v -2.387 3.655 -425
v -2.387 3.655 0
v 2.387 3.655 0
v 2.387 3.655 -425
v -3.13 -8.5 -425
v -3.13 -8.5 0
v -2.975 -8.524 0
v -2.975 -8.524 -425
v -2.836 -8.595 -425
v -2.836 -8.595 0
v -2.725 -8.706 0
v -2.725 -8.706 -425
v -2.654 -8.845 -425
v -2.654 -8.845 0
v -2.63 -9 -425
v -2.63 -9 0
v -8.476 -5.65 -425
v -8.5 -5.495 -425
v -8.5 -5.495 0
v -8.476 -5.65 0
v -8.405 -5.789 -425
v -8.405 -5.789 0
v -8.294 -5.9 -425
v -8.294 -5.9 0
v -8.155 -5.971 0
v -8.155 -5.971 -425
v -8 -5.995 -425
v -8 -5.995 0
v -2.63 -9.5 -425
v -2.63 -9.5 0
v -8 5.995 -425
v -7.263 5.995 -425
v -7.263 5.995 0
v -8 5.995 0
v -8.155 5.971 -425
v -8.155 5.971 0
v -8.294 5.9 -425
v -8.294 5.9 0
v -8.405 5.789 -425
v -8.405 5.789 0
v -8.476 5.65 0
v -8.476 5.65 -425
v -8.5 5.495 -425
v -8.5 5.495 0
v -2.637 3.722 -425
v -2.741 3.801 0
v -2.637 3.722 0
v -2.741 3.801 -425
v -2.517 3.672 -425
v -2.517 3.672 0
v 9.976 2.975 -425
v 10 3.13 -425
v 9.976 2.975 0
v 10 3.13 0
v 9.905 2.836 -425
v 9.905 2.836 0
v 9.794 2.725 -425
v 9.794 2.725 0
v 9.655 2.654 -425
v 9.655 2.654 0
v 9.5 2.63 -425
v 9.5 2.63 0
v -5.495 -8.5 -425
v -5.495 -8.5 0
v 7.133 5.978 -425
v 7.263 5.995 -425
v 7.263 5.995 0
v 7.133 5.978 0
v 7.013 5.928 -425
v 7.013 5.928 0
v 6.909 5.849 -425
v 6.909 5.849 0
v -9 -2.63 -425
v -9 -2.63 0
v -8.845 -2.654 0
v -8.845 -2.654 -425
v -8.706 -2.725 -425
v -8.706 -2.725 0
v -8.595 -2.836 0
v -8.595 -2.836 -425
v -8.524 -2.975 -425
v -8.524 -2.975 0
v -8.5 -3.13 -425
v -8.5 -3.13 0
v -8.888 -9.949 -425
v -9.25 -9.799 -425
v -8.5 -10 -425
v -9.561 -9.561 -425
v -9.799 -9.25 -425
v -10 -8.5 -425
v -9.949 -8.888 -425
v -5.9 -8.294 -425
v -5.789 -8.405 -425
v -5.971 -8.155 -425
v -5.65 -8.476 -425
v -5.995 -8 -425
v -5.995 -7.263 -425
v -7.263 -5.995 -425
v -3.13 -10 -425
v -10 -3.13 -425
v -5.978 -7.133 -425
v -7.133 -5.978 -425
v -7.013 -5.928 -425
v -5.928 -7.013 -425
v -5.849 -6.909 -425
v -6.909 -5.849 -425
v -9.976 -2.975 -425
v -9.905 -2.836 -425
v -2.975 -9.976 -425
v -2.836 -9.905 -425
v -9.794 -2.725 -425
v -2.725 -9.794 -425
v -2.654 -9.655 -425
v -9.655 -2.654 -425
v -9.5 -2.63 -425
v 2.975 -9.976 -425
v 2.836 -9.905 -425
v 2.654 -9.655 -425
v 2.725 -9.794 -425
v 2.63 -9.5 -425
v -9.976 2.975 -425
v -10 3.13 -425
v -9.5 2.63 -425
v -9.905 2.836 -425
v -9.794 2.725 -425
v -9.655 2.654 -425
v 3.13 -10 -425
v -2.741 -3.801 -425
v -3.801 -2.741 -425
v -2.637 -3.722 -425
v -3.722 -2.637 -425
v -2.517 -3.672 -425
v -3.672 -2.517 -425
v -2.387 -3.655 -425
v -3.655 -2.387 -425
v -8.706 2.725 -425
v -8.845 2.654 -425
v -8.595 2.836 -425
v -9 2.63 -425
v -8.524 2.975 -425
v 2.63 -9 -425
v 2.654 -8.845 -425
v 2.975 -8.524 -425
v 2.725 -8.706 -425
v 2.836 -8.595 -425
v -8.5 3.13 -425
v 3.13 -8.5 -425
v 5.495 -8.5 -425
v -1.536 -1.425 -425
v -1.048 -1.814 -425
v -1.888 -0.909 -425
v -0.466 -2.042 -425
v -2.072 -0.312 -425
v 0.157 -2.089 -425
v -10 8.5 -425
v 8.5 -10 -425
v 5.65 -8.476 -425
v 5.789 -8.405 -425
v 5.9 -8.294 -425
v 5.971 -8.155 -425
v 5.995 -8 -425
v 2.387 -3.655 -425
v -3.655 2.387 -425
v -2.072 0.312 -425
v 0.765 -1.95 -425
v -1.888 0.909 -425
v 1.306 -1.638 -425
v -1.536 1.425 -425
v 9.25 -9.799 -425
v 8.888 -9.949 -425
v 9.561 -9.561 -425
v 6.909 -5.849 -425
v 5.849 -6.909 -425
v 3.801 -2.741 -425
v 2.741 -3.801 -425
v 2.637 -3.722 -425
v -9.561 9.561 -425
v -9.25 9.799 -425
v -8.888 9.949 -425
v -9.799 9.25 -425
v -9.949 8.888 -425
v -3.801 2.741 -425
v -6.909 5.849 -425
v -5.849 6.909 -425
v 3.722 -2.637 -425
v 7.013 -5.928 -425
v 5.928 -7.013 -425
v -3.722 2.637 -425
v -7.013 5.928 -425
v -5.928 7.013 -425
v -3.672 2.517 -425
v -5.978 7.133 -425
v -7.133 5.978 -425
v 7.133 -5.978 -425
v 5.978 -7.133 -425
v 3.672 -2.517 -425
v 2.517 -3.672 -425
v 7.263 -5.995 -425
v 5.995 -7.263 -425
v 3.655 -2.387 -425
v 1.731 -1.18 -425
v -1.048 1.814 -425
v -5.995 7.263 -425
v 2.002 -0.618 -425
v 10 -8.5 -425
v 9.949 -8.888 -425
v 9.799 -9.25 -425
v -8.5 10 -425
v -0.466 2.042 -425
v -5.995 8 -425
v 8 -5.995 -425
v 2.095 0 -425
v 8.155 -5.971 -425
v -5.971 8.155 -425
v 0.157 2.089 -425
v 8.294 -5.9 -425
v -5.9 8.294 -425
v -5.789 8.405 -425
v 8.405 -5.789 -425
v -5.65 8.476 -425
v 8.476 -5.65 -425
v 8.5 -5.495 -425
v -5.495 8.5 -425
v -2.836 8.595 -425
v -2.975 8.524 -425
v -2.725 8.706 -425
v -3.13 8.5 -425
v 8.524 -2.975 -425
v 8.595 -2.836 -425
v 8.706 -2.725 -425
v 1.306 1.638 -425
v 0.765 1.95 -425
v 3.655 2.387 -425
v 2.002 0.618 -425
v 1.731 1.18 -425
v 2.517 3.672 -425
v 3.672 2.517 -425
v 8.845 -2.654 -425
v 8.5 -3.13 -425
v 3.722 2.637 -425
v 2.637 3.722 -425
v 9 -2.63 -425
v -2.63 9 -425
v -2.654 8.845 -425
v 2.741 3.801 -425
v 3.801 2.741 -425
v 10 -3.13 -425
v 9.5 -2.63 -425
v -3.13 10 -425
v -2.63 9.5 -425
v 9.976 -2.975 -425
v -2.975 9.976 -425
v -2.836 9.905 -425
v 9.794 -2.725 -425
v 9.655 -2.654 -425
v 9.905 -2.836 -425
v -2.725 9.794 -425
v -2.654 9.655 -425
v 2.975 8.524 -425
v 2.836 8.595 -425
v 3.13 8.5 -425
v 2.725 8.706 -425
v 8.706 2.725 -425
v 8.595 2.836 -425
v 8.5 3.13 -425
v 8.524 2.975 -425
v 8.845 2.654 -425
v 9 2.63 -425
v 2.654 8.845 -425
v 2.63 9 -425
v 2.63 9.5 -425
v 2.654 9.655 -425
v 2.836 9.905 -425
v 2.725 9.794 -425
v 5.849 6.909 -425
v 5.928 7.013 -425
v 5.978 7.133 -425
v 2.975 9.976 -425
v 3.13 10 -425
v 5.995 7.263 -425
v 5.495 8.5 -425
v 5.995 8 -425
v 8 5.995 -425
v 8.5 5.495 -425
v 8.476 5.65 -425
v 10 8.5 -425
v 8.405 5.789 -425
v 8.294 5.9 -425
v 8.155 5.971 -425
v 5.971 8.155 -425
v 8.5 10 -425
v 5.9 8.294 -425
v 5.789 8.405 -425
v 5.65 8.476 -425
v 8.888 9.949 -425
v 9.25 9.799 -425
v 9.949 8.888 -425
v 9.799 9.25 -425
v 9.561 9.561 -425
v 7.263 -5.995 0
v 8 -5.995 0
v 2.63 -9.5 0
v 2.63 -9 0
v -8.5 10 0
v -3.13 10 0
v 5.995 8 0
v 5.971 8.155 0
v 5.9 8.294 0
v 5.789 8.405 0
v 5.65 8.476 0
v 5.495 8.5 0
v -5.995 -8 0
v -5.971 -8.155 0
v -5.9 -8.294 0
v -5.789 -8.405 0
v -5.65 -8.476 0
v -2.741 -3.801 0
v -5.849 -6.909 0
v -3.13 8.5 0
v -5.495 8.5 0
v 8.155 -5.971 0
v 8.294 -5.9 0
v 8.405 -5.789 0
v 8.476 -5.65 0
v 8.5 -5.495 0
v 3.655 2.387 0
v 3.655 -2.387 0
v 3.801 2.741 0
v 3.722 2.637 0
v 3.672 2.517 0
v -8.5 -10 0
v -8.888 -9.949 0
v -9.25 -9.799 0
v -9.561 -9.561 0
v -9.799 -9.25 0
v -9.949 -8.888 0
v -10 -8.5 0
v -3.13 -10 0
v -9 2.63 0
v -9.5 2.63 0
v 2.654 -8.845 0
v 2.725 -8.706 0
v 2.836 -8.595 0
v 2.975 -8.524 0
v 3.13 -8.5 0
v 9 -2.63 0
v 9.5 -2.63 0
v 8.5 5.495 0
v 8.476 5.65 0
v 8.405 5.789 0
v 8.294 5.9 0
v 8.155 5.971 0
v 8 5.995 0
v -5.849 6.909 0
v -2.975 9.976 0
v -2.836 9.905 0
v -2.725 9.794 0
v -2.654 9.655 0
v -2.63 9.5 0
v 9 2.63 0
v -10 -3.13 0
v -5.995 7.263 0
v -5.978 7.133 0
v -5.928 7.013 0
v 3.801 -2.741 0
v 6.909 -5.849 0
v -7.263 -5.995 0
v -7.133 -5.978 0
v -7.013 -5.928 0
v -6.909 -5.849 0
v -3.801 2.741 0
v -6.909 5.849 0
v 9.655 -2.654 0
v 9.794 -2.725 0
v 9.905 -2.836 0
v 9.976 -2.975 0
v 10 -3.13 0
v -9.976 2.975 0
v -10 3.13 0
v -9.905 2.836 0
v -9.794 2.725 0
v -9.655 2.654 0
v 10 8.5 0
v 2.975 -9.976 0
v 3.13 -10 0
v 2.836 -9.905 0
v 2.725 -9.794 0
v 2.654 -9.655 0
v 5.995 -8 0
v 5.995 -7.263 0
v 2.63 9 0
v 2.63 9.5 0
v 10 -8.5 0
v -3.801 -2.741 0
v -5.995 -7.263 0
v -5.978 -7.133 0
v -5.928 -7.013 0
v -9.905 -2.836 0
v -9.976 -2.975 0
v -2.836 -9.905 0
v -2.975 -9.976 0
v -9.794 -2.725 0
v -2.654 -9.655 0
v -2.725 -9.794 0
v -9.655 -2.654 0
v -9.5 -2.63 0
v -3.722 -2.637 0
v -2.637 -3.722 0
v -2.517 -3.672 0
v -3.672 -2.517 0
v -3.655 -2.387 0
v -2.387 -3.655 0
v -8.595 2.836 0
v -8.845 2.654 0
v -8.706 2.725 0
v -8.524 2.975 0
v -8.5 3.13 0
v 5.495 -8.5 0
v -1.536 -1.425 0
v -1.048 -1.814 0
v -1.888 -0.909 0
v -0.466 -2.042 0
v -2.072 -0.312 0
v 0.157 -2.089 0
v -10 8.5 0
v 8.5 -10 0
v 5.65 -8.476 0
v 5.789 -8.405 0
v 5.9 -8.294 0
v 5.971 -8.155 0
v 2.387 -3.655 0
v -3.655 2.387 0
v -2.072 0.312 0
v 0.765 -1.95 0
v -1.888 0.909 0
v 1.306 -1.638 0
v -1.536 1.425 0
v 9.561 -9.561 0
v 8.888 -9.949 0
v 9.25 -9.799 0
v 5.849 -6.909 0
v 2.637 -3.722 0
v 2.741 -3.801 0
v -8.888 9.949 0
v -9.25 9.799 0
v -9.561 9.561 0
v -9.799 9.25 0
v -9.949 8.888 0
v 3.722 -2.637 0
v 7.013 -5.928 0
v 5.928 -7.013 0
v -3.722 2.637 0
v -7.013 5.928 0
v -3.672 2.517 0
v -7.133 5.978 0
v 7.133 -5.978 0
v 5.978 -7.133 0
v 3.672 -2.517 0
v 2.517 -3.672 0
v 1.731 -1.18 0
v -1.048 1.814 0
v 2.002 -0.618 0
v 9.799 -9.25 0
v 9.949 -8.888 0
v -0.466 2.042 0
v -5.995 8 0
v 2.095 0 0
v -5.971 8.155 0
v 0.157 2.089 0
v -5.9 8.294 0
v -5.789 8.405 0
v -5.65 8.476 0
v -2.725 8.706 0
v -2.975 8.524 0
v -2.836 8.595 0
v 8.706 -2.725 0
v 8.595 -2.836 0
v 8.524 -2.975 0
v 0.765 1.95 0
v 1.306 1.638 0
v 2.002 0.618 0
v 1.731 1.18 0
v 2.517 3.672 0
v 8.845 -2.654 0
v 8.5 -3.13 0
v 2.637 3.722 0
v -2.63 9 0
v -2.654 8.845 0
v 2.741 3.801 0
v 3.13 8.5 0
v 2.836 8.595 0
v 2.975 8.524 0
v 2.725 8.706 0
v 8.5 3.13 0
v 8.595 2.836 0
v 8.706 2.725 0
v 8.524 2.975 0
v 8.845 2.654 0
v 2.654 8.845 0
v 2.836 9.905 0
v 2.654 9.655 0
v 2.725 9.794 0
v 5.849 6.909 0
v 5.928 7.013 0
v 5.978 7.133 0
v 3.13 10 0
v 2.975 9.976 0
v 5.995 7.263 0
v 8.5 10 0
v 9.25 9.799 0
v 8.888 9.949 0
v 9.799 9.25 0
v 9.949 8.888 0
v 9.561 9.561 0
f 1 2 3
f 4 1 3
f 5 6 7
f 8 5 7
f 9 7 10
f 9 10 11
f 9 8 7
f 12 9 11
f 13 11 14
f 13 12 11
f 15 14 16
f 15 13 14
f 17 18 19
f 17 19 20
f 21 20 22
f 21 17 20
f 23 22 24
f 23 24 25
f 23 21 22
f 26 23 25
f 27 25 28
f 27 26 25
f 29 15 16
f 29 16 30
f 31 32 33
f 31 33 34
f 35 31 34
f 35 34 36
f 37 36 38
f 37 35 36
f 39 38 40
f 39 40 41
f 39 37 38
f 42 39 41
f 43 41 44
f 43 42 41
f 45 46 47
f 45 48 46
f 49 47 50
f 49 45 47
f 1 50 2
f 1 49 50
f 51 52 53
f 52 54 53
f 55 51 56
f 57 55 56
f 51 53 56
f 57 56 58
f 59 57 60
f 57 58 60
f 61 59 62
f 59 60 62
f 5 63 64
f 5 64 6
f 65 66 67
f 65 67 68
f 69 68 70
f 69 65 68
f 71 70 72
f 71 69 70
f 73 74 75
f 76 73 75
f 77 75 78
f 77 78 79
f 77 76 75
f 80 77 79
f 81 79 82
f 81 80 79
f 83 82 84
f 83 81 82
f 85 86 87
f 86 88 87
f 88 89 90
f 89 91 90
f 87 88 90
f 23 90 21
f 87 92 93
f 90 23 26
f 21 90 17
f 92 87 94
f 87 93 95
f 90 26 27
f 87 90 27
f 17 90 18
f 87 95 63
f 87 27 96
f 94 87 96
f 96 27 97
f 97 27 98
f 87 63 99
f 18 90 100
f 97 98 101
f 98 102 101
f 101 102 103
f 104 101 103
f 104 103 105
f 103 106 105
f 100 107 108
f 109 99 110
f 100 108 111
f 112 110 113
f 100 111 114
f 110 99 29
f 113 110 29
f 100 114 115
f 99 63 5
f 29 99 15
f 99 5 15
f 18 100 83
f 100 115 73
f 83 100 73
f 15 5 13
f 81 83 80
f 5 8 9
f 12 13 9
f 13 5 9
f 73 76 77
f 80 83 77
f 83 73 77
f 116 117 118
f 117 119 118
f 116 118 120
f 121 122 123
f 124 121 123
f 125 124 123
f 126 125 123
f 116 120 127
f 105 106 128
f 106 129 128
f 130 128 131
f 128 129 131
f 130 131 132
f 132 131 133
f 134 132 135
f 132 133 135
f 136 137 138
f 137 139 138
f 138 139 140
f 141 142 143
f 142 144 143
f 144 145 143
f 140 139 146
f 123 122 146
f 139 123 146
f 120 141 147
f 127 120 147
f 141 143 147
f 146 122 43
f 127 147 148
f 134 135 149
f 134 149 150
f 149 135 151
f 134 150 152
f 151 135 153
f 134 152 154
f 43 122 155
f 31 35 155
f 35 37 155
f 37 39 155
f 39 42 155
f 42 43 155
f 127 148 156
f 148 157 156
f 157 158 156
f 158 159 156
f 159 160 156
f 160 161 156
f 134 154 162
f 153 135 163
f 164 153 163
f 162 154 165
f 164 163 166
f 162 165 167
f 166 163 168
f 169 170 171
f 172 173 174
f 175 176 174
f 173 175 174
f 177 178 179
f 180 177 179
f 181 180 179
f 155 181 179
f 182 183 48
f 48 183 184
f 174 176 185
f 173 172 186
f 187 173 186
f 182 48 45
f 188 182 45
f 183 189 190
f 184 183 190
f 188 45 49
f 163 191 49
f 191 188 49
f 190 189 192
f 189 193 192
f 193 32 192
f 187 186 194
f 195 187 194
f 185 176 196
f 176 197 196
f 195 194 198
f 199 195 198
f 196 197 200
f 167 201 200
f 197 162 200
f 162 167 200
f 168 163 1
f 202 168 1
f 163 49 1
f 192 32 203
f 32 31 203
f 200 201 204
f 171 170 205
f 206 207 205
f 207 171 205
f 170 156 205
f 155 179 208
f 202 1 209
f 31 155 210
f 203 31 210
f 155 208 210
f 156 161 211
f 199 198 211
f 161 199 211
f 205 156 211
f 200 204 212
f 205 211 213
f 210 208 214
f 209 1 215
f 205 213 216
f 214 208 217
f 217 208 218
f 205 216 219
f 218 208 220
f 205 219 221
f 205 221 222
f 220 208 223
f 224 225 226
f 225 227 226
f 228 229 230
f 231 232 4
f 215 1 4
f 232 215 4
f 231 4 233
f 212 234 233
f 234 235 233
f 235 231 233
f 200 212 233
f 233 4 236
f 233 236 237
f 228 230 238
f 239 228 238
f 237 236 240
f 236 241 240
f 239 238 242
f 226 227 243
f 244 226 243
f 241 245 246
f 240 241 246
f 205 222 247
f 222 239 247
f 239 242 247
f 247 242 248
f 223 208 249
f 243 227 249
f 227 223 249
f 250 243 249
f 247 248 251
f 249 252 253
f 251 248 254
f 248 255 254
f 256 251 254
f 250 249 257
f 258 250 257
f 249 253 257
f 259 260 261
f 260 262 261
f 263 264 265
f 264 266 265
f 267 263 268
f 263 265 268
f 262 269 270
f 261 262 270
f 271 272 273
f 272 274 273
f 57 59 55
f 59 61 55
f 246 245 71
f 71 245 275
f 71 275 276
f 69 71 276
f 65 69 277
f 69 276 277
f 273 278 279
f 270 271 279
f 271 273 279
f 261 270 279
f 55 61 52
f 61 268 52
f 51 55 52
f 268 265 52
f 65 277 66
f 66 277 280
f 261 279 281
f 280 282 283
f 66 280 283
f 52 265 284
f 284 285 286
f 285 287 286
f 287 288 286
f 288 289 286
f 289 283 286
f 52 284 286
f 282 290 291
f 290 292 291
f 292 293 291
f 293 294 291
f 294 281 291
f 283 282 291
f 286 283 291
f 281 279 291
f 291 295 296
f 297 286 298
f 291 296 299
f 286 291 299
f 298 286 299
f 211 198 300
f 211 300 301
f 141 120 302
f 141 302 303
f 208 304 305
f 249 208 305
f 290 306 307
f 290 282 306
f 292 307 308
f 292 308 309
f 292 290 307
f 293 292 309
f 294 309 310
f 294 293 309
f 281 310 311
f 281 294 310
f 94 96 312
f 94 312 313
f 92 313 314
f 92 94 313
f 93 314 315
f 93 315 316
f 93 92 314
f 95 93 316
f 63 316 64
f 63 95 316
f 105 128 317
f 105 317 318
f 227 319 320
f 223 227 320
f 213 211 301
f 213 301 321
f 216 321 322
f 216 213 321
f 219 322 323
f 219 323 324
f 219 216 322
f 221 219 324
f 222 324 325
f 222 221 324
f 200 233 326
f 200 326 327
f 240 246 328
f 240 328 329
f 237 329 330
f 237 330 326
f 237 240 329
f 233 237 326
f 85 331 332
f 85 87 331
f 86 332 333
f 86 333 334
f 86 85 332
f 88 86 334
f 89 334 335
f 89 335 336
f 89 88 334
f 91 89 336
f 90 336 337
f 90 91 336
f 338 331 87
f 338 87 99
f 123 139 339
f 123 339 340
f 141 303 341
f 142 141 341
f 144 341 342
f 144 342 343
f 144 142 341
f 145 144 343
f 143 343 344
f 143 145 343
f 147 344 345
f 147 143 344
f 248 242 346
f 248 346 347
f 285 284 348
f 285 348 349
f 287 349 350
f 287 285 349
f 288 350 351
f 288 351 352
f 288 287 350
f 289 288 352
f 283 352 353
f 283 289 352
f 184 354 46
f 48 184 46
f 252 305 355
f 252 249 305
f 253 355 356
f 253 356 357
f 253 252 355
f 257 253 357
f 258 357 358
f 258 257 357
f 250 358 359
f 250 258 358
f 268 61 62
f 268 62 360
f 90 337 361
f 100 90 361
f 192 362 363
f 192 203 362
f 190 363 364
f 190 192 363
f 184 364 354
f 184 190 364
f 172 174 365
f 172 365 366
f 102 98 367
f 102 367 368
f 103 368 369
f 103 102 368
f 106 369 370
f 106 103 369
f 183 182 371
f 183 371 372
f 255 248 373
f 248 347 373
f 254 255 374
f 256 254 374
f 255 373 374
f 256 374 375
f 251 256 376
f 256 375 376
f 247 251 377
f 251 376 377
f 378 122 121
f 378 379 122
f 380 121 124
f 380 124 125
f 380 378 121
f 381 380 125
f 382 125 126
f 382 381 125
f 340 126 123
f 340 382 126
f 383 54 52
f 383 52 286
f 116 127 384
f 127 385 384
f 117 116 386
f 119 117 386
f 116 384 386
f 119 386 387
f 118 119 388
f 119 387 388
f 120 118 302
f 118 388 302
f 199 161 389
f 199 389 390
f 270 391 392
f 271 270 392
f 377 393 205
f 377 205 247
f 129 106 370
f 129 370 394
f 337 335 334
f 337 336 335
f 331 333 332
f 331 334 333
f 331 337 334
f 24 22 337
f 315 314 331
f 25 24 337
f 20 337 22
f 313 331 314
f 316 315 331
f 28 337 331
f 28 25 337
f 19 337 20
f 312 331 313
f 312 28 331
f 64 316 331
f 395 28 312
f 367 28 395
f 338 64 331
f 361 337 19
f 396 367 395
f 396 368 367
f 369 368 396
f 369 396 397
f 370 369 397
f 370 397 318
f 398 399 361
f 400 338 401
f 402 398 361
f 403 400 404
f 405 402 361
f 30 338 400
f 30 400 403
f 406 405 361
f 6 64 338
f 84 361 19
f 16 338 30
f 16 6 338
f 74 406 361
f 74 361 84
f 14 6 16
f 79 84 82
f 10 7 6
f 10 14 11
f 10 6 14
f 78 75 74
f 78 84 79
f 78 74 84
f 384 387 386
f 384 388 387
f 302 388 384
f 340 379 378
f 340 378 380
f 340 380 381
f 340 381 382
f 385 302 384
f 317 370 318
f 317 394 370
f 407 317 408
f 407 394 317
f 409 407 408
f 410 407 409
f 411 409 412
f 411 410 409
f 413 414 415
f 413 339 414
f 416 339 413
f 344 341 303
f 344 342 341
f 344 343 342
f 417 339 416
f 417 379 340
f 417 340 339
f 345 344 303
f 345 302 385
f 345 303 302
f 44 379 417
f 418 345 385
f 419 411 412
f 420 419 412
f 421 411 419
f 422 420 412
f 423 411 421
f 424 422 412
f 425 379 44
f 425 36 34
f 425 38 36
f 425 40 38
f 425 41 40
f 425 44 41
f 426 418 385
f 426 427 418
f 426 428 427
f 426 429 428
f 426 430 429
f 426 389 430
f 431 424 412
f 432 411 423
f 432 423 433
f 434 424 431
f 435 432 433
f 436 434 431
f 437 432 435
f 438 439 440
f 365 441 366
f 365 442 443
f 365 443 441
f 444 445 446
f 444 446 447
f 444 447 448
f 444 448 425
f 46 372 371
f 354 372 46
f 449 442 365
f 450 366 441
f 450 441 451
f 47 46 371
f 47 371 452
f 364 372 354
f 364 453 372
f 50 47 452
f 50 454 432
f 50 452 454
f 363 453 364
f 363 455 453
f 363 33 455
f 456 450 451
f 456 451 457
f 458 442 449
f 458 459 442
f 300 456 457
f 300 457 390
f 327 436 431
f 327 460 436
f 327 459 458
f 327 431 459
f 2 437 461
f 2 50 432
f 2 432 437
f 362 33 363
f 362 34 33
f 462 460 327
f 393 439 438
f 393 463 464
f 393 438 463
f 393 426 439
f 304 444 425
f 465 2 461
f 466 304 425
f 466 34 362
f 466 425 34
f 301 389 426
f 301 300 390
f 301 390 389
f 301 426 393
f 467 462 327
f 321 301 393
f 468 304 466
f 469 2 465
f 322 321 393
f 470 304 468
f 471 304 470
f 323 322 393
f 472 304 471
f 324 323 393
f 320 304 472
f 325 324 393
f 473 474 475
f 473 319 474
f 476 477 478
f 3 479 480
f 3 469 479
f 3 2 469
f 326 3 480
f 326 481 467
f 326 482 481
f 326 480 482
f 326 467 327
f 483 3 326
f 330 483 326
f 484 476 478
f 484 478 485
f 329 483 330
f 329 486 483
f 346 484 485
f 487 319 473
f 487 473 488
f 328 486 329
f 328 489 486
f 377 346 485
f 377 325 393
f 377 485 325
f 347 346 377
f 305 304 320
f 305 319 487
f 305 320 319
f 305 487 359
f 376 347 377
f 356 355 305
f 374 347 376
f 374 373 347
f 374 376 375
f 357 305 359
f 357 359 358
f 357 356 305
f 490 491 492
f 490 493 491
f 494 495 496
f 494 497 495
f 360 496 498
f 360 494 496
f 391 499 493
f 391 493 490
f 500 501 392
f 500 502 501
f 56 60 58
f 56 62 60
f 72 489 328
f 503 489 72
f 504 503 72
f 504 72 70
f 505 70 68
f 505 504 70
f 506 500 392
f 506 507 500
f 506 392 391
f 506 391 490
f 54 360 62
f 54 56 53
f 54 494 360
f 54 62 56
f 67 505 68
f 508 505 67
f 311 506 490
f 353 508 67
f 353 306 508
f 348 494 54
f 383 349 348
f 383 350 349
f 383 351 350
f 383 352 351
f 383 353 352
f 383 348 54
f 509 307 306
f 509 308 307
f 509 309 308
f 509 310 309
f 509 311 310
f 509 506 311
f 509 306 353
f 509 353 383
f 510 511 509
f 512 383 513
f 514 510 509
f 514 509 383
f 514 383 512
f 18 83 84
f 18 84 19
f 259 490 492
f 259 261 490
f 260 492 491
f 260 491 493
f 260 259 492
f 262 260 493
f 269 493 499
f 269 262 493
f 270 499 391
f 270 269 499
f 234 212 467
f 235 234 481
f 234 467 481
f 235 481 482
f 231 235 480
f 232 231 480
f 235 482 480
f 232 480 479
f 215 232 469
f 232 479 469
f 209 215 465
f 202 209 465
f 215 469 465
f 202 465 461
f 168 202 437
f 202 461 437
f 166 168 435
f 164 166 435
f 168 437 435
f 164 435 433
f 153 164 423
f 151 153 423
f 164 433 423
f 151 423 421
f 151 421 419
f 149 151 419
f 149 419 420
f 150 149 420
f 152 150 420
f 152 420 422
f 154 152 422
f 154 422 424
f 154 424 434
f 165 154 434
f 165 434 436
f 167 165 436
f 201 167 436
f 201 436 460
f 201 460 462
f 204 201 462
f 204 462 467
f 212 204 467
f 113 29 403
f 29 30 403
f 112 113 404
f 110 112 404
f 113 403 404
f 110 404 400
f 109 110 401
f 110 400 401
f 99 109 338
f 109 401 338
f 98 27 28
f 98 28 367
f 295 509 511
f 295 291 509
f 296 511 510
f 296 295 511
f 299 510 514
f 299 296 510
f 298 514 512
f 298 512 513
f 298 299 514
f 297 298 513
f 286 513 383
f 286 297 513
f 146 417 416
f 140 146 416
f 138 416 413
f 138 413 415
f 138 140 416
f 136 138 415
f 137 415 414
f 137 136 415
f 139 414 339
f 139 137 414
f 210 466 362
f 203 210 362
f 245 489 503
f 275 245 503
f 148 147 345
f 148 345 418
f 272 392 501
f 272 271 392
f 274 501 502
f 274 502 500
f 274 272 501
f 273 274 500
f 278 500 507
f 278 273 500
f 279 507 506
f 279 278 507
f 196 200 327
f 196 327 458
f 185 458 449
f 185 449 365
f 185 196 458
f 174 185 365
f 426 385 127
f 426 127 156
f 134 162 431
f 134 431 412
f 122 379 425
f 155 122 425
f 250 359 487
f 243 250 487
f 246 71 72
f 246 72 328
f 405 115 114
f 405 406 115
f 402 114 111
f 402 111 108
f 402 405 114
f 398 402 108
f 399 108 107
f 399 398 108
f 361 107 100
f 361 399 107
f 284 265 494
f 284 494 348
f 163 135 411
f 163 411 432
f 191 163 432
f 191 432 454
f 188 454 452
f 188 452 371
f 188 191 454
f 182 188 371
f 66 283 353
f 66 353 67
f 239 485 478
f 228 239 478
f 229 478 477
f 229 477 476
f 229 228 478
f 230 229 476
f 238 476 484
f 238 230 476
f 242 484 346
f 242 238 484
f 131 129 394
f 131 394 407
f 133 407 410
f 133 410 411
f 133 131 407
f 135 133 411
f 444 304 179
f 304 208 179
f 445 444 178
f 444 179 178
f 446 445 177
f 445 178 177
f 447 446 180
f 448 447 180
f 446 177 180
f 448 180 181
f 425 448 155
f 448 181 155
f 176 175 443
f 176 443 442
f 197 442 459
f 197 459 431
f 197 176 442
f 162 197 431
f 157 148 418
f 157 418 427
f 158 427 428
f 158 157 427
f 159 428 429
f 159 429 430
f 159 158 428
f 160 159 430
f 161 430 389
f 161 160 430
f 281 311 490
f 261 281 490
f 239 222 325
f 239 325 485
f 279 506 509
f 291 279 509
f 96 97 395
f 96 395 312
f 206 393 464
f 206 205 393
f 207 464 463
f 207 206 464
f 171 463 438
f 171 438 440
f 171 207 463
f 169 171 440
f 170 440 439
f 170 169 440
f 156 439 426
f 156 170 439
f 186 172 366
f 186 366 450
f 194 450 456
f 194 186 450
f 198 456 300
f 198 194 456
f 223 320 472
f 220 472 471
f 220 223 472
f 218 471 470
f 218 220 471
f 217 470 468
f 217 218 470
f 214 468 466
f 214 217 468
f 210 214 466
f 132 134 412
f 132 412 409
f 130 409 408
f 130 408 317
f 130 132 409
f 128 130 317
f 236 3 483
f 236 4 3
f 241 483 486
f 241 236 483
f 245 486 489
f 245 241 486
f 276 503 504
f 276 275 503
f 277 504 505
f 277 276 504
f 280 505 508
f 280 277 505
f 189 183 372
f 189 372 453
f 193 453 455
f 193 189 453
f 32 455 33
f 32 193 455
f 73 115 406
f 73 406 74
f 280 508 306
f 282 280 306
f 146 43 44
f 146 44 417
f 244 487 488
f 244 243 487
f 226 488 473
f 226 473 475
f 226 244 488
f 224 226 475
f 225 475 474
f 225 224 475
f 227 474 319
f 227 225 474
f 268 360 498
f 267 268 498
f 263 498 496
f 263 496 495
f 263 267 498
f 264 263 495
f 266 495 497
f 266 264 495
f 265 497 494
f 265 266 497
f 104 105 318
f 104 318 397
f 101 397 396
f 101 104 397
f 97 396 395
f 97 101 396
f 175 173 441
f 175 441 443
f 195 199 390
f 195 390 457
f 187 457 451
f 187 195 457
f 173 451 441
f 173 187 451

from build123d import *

# Parameters (mm, degrees)
SKETCH1_W           = 20
SKETCH1_H           = 20
BOSS_EXTRUDE1_DEPTH = 425
CUT_EXTRUDE1_DEPTH  = 426.23522902
FILLET1_R           = 0.5
CIRPATTERN1_START   = -425
CIRPATTERN1_DEPTH   = 425
FILLET2_R           = 1.5
SKETCH3_R           = 2.095
CUT_EXTRUDE2_DEPTH  = 426.23522902
FILLET3_R           = 0.5


# Read off the part's stored shape, not the designer's step: CirPattern1
with BuildPart() as part:
    # Sketch1 → Boss-Extrude1 (new body)
    with BuildSketch(Plane.XY):
        Rectangle(SKETCH1_W, SKETCH1_H)
    extrude(amount=-BOSS_EXTRUDE1_DEPTH)

    # Sketch2 → Cut-Extrude1 (cut, through all)
    with BuildSketch(Plane.XY):
        Polygon((0, 10), (-2.63, 10), (-2.63, 8.5), (-5.995, 8.5), (-5.995, 7.055660172), (-2.594339828, 3.655), (2.594339828, 3.655), (5.995, 7.055660172), (5.995, 8.5), (2.63, 8.5), (2.63, 10), align=None)
    extrude(amount=-CUT_EXTRUDE1_DEPTH, mode=Mode.SUBTRACT)

    # Fillet1
    fillet1_edges = [part.edges().sort_by_distance(p)[0] for p in [
        (2.63, 10, -212.5),
        (2.63, 8.5, -212.5),
        (5.995, 8.5, -212.5),
        (5.995, 7.055660172, -212.5),
        (2.594339828, 3.655, -212.5),
        (-2.594339828, 3.655, -212.5),
        (-5.995, 7.055660172, -212.5),
        (-5.995, 8.5, -212.5),
        (-2.63, 8.5, -212.5),
        (-2.63, 10, -212.5),
    ]]
    fillet(fillet1_edges, radius=FILLET1_R)

    # CirPattern1 outline → CirPattern1 (cut)
    with BuildSketch(Plane.XY.offset(CIRPATTERN1_START)):
        with BuildLine():
            Line((-2.63, -10), (2.63, -10))
            Line((2.63, -10), (2.63, -9))
            ThreePointArc((2.63, -9), (2.776446609, -8.646446609), (3.13, -8.5))
            Line((3.13, -8.5), (5.495, -8.5))
            ThreePointArc((5.495, -8.5), (5.848553391, -8.353553391), (5.995, -8))
            Line((5.995, -8), (5.995, -7.262766953))
            ThreePointArc((5.995, -7.262766953), (5.956939766, -7.071425237), (5.848553391, -6.909213562))
            Line((5.848553391, -6.909213562), (2.740786438, -3.801446609))
            ThreePointArc((2.740786438, -3.801446609), (2.578574763, -3.693060234), (2.387233047, -3.655))
            Line((2.387233047, -3.655), (-2.387233047, -3.655))
            ThreePointArc((-2.387233047, -3.655), (-2.578574763, -3.693060234), (-2.740786438, -3.801446609))
            Line((-2.740786438, -3.801446609), (-5.848553391, -6.909213562))
            ThreePointArc((-5.848553391, -6.909213562), (-5.956939766, -7.071425237), (-5.995, -7.262766953))
            Line((-5.995, -7.262766953), (-5.995, -8))
            ThreePointArc((-5.995, -8), (-5.848553391, -8.353553391), (-5.495, -8.5))
            Line((-5.495, -8.5), (-3.13, -8.5))
            ThreePointArc((-3.13, -8.5), (-2.776446609, -8.646446609), (-2.63, -9))
            Line((-2.63, -9), (-2.63, -10))
        make_face()
        with BuildLine():
            Line((-10, 2.63), (-10, -2.63))
            Line((-10, -2.63), (-9, -2.63))
            ThreePointArc((-9, -2.63), (-8.646446609, -2.776446609), (-8.5, -3.13))
            Line((-8.5, -3.13), (-8.5, -5.495))
            ThreePointArc((-8.5, -5.495), (-8.353553391, -5.848553391), (-8, -5.995))
            Line((-8, -5.995), (-7.262766953, -5.995))
            ThreePointArc((-7.262766953, -5.995), (-7.071425237, -5.956939766), (-6.909213562, -5.848553391))
            Line((-6.909213562, -5.848553391), (-3.801446609, -2.740786438))
            ThreePointArc((-3.801446609, -2.740786438), (-3.693060234, -2.578574763), (-3.655, -2.387233047))
            Line((-3.655, -2.387233047), (-3.655, 2.387233047))
            ThreePointArc((-3.655, 2.387233047), (-3.693060234, 2.578574763), (-3.801446609, 2.740786438))
            Line((-3.801446609, 2.740786438), (-6.909213562, 5.848553391))
            ThreePointArc((-6.909213562, 5.848553391), (-7.071425237, 5.956939766), (-7.262766953, 5.995))
            Line((-7.262766953, 5.995), (-8, 5.995))
            ThreePointArc((-8, 5.995), (-8.353553391, 5.848553391), (-8.5, 5.495))
            Line((-8.5, 5.495), (-8.5, 3.13))
            ThreePointArc((-8.5, 3.13), (-8.646446609, 2.776446609), (-9, 2.63))
            Line((-9, 2.63), (-10, 2.63))
        make_face()
        with BuildLine():
            Line((9, -2.63), (10, -2.63))
            Line((10, -2.63), (10, 2.63))
            Line((10, 2.63), (9, 2.63))
            ThreePointArc((9, 2.63), (8.646446609, 2.776446609), (8.5, 3.13))
            Line((8.5, 3.13), (8.5, 5.495))
            ThreePointArc((8.5, 5.495), (8.353553391, 5.848553391), (8, 5.995))
            Line((8, 5.995), (7.262766953, 5.995))
            ThreePointArc((7.262766953, 5.995), (7.071425237, 5.956939766), (6.909213562, 5.848553391))
            Line((6.909213562, 5.848553391), (3.801446609, 2.740786438))
            ThreePointArc((3.801446609, 2.740786438), (3.693060234, 2.578574763), (3.655, 2.387233047))
            Line((3.655, 2.387233047), (3.655, -2.387233047))
            ThreePointArc((3.655, -2.387233047), (3.693060234, -2.578574763), (3.801446609, -2.740786438))
            Line((3.801446609, -2.740786438), (6.909213562, -5.848553391))
            ThreePointArc((6.909213562, -5.848553391), (7.071425237, -5.956939766), (7.262766953, -5.995))
            Line((7.262766953, -5.995), (8, -5.995))
            ThreePointArc((8, -5.995), (8.353553391, -5.848553391), (8.5, -5.495))
            Line((8.5, -5.495), (8.5, -3.13))
            ThreePointArc((8.5, -3.13), (8.646446609, -2.776446609), (9, -2.63))
        make_face()
    extrude(amount=CIRPATTERN1_DEPTH, mode=Mode.SUBTRACT)

    # Fillet2
    fillet2_edges = [part.edges().sort_by_distance(p)[0] for p in [
        (10, -10, -212.5),
        (-10, -10, -212.5),
        (-10, 10, -212.5),
        (10, 10, -212.5),
    ]]
    fillet(fillet2_edges, radius=FILLET2_R)

    # Sketch3 → Cut-Extrude2 (cut, through all)
    with BuildSketch(Plane.XY):
        Circle(SKETCH3_R)
    extrude(amount=-CUT_EXTRUDE2_DEPTH, mode=Mode.SUBTRACT)

    # Fillet3
    fillet3_edges = [part.edges().sort_by_distance(p)[0] for p in [
        (-10, 2.63, -212.5),
        (-10, -2.63, -212.5),
        (-2.63, -10, -212.5),
        (2.63, -10, -212.5),
        (10, -2.63, -212.5),
        (10, 2.63, -212.5),
    ]]
    fillet(fillet3_edges, radius=FILLET3_R)


solid = part.part
